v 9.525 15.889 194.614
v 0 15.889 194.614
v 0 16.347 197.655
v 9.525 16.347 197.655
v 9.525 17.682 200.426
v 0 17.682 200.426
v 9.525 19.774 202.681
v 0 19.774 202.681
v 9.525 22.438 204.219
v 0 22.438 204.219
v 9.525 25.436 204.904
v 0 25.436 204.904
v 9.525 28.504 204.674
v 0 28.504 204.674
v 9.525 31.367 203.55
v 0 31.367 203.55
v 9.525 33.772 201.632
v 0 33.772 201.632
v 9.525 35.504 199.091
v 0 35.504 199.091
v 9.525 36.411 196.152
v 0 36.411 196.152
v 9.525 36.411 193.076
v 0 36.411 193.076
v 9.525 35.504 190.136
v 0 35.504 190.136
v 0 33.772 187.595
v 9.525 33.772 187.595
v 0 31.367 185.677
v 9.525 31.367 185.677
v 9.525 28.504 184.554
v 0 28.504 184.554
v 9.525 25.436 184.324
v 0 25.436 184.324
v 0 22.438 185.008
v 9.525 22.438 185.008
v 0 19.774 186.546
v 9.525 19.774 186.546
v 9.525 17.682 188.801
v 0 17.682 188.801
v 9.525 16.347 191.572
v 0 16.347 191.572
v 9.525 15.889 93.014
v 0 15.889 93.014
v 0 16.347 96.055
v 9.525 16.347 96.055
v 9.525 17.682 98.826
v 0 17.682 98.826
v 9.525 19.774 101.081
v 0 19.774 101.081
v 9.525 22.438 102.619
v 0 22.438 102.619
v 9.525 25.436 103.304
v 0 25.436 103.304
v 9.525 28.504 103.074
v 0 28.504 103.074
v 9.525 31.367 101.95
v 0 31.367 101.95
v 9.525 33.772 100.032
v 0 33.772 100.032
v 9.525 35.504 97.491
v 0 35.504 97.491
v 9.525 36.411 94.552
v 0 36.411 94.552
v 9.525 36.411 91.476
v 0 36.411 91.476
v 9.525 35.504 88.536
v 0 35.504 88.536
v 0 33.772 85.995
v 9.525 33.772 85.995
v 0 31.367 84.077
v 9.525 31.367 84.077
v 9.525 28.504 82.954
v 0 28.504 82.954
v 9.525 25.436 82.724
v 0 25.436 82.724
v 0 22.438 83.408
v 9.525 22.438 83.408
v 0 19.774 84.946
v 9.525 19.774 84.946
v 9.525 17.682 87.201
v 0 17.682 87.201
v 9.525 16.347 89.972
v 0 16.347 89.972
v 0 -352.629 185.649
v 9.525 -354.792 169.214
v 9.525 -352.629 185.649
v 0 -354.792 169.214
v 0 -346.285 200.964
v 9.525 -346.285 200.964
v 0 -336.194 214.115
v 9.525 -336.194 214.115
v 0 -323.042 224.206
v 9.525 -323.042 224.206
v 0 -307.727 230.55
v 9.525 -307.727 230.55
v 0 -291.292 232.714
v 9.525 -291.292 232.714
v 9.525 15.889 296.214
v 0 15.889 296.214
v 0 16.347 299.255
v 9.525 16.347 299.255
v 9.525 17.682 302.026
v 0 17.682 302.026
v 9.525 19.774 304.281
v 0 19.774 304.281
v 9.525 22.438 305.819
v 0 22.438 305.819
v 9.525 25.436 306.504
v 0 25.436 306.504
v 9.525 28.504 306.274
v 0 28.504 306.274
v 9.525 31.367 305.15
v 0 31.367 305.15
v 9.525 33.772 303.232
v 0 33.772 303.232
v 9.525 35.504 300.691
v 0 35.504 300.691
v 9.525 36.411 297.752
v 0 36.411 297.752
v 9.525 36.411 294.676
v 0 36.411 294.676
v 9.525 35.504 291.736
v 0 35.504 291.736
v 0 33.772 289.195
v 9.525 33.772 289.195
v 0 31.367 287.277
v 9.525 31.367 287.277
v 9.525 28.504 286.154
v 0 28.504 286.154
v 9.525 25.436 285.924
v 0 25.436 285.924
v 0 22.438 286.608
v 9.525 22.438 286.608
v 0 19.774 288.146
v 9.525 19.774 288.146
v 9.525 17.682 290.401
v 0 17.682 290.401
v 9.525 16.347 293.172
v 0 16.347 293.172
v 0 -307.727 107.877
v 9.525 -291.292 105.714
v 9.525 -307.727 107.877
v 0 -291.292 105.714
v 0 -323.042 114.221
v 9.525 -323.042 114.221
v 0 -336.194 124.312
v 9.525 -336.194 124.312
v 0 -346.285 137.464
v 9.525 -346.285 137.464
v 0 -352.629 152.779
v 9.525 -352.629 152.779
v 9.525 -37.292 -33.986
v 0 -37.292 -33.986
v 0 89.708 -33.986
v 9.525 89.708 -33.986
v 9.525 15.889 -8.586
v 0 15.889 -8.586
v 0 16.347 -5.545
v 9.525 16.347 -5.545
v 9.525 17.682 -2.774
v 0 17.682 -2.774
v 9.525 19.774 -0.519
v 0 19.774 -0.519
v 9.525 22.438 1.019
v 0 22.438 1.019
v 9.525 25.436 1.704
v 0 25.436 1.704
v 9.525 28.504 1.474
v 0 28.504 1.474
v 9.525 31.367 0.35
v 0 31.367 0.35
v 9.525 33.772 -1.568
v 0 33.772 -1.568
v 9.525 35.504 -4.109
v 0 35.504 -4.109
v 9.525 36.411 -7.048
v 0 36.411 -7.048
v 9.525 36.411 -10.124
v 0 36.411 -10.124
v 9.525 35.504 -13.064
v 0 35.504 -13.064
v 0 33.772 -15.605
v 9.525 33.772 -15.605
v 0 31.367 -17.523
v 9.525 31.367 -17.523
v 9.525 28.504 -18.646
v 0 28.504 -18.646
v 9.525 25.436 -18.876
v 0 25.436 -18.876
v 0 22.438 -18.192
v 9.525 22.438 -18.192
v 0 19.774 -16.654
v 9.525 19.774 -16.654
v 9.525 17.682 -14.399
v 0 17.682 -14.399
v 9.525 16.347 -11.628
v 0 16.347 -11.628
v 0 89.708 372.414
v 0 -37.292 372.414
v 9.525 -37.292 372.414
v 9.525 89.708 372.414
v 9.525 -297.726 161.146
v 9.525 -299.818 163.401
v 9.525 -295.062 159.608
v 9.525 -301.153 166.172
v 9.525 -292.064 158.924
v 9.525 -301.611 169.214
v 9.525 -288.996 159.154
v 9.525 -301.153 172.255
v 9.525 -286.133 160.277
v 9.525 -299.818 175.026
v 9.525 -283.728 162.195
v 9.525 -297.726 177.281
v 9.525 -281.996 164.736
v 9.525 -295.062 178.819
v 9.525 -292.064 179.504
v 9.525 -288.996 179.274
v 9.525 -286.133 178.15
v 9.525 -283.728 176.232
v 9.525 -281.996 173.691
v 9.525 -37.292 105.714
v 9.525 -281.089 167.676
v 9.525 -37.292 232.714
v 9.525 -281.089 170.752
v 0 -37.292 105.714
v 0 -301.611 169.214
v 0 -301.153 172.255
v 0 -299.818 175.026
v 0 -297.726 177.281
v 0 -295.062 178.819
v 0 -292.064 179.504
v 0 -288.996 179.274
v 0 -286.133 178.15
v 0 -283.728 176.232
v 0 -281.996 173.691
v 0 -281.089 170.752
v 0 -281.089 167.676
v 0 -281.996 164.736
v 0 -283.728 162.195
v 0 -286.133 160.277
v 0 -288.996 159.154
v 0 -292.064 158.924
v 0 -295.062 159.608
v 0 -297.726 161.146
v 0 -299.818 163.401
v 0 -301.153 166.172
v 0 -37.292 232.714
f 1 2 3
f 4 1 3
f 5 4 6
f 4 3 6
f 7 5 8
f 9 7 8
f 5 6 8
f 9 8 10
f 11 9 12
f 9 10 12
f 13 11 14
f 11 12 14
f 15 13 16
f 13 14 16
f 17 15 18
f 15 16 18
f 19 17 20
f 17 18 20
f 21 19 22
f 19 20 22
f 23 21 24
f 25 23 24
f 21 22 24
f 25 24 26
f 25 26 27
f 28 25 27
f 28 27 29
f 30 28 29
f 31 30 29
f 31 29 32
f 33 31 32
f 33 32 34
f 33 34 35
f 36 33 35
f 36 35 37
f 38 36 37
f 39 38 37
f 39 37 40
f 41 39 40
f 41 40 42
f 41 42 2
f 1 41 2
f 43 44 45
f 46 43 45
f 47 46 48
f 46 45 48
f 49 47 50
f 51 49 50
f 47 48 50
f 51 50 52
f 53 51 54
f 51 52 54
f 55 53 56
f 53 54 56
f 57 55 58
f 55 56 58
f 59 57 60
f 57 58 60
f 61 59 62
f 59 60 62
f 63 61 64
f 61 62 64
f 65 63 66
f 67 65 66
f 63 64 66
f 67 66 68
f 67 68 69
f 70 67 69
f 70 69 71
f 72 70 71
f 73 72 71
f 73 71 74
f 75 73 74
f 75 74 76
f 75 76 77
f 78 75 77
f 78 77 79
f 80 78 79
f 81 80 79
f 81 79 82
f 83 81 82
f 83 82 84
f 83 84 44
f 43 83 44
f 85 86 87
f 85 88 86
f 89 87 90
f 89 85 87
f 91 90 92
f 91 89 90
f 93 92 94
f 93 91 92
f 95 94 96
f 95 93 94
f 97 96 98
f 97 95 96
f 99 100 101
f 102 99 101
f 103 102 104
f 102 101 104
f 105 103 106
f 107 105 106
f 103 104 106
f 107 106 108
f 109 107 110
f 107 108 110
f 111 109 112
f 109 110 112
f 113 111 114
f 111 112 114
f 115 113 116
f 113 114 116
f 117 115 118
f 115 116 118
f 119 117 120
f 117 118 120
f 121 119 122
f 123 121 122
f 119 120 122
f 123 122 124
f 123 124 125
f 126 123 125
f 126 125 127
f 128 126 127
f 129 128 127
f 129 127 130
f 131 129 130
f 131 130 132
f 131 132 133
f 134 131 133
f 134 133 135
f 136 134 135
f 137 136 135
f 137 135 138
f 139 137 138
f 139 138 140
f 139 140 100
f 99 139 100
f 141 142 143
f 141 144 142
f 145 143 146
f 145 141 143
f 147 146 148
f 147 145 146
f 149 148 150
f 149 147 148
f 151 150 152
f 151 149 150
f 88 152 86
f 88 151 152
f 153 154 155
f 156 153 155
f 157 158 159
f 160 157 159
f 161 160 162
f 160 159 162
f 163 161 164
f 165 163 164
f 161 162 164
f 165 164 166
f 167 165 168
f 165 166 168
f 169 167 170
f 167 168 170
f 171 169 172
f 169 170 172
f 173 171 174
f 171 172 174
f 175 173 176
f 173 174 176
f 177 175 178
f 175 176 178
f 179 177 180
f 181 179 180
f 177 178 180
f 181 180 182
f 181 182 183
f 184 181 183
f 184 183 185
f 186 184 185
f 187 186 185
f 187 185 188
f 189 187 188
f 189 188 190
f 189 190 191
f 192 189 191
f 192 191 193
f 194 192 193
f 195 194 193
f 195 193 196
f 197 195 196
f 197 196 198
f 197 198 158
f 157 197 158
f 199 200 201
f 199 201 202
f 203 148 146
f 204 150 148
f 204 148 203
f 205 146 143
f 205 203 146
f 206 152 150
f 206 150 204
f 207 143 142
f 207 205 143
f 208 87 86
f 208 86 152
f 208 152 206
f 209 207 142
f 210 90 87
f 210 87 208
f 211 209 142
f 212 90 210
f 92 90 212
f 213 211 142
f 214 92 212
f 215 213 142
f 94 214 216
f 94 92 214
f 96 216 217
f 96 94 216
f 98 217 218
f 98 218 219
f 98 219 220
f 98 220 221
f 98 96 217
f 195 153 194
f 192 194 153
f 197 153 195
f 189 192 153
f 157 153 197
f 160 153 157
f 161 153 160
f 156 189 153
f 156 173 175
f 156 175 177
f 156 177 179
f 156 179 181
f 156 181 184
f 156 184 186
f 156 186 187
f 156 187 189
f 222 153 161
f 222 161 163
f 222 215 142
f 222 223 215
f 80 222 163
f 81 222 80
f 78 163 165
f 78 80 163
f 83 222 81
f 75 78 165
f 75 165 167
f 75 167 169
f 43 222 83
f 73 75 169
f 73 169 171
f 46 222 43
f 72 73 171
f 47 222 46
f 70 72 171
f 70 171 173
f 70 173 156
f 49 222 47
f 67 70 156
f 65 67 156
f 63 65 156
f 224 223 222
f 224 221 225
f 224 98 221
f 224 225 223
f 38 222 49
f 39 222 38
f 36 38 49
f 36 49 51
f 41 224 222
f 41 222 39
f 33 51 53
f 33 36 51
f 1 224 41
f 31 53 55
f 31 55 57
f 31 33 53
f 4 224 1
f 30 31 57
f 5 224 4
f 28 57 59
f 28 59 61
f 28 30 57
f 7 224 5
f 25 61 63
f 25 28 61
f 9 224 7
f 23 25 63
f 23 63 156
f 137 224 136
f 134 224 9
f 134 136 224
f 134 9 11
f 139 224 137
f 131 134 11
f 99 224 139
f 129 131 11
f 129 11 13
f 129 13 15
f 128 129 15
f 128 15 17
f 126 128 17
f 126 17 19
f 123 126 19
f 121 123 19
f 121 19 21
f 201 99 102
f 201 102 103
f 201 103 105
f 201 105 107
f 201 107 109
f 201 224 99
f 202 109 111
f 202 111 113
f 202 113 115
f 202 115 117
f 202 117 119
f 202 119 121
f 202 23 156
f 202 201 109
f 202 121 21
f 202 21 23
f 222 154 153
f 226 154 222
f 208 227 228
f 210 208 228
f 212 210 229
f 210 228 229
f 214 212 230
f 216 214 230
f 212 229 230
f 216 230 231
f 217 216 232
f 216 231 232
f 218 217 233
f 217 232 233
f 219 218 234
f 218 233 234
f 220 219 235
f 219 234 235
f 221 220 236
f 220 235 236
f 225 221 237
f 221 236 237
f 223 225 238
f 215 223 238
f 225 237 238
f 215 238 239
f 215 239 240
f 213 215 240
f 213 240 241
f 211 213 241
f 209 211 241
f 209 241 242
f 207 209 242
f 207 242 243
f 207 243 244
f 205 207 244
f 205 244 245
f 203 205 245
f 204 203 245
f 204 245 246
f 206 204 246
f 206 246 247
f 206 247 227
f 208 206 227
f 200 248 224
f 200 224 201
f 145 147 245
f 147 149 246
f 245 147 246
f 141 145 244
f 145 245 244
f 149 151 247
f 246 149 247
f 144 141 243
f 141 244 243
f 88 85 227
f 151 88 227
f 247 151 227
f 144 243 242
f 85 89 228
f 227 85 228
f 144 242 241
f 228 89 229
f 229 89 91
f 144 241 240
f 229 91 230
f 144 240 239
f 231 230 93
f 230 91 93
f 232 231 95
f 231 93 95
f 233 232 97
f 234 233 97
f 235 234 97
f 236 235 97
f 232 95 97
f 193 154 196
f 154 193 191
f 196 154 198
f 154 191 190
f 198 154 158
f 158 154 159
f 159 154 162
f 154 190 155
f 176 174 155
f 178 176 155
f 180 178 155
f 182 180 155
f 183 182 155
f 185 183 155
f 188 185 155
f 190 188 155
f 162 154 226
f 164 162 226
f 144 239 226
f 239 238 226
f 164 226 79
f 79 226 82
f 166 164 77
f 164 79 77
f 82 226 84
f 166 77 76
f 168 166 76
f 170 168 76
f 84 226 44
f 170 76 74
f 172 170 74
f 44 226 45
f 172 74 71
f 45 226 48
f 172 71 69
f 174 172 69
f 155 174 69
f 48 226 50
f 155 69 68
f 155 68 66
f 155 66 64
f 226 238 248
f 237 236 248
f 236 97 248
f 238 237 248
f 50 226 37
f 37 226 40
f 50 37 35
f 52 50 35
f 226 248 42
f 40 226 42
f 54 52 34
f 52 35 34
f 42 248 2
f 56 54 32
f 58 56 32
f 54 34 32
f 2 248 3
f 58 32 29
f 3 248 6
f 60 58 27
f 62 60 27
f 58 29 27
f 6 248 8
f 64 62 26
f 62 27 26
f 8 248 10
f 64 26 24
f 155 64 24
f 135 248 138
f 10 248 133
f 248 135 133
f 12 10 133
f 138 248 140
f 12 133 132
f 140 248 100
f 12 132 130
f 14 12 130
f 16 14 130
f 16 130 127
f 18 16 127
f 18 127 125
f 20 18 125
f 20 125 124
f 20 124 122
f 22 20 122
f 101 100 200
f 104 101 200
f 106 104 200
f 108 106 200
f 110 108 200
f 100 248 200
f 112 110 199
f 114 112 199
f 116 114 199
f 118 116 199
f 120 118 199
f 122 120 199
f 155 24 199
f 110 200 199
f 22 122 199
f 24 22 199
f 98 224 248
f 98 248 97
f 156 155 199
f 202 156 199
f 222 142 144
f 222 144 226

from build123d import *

# Parameters (mm, degrees)
F0_W     = 127
F0_H     = 406.4
F1_DEPTH = 9.525
F3_DEPTH = 9.525
F4_R     = 63.49999
F6_D     = 20.6375
F8_D     = 20.6375


# Not quite as in the source:
# - a fillet or chamfer is up to 0.001 mm smaller than in the source, because OpenCascade refuses the exact size
# - a length typed as a fraction of an inch, garbled in the dataset ("3 / 203.2 mm" for 3/8 in), is restored


with BuildPart() as f1:
    # F0 (on Right) → F1 (new body)
    with BuildSketch(Plane.YZ):
        with Locations((26.2075642347, 169.2136289895)):
            Rectangle(F0_W, F0_H)
    extrude(amount=F1_DEPTH)

    # F2 (on face) → F3 (join)
    with BuildSketch(Plane.YZ.offset(9.525)):
        Polygon((-37.2924357653, 105.7136289895), (-37.2924357653, 169.2136289895), (-37.2924357653, 232.7136289895), (-354.7924357653, 232.7136289895), (-354.7924357653, 105.7136289895), align=None)
    extrude(amount=-F3_DEPTH)

    # F4 (radius 63.5 in the source; OpenCascade refuses exactly that, so slightly less here)
    f4_edges = [f1.edges().sort_by_distance(p)[0] for p in [
        (4.7625, -354.792436, 232.713629),
        (4.7625, -354.792436, 105.713629),
    ]]
    fillet(f4_edges, radius=F4_R)

    # F6 (through all)
    with Locations(Plane.YZ.offset(9.525)):
        with Locations((-291.2924357653, 169.2136289895)):
            Hole(F6_D / 2)

    # F8 (through all)
    with Locations(Plane.YZ.offset(9.525)):
        with Locations((26.2075642347, 296.2136289895), (26.2075642347, 194.6136289895), (26.2075642347, 93.0136289895), (26.2075642347, -8.5863710105)):
            Hole(F8_D / 2)


solid = f1.part
